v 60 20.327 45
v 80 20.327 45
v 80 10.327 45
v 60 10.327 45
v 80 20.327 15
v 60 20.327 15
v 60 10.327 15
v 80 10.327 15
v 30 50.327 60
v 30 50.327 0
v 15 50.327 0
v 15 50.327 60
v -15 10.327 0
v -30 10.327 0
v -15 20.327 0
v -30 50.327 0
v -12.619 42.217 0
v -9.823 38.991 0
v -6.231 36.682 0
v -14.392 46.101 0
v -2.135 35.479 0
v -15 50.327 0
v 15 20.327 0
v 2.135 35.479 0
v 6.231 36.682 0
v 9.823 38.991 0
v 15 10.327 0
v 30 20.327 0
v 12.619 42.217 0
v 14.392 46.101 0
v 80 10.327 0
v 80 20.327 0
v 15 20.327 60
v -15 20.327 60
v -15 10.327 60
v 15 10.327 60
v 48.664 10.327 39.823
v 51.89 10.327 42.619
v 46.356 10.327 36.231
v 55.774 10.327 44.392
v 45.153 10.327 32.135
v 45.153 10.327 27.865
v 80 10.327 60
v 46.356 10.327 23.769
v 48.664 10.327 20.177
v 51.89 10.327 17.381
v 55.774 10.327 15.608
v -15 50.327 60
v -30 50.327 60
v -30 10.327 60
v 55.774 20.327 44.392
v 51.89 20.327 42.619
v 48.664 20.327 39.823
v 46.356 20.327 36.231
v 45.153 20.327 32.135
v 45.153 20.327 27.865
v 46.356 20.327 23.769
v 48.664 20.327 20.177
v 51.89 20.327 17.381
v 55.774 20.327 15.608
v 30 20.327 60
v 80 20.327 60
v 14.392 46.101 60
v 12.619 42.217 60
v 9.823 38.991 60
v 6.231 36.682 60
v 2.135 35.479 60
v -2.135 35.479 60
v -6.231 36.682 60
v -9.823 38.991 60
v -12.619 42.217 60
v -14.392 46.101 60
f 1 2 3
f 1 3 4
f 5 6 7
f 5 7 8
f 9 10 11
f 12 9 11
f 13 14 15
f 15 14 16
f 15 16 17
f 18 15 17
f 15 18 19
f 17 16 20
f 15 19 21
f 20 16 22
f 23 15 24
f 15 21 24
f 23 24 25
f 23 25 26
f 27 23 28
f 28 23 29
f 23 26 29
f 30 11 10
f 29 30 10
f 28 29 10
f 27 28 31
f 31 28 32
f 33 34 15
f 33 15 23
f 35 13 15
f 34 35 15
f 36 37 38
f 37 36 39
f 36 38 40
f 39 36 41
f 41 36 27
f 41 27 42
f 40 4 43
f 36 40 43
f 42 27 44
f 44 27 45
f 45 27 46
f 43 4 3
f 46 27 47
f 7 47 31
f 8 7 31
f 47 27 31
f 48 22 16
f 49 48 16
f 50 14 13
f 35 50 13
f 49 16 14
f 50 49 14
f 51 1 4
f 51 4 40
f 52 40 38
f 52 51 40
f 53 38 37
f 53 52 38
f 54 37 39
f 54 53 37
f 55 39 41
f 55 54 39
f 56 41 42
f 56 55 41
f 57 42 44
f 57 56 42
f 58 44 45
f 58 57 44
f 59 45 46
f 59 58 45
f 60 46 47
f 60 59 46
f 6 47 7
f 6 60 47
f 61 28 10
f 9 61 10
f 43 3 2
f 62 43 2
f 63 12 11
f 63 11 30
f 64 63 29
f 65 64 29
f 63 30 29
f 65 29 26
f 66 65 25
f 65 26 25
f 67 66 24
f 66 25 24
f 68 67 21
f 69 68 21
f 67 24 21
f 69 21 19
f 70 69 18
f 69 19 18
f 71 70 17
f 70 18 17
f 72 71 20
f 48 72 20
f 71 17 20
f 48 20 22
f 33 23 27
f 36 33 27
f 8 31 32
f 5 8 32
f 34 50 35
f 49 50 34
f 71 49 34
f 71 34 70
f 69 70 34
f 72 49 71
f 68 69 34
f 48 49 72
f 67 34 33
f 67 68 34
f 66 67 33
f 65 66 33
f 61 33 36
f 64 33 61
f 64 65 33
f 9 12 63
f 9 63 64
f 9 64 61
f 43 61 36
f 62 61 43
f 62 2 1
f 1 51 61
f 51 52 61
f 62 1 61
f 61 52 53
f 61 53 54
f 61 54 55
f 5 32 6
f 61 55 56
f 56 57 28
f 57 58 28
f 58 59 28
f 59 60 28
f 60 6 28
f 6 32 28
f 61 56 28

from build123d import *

# Parameters (mm, degrees)
BOSS_EXTRUDE1_DEPTH = 60
CUT_EXTRUDE1_DEPTH  = 60


with BuildPart() as part:
    # Sketch1 → Boss-Extrude1 (new body)
    with BuildSketch(Plane.XY):
        with BuildLine():
            Line((-30, 50.32677643), (-30, 10.32677643))
            Line((-30, 10.32677643), (-15, 10.32677643))
            Line((-15, 10.32677643), (-15, 20.32677643))
            Line((-15, 20.32677643), (15, 20.32677643))
            Line((15, 20.32677643), (15, 10.32677643))
            Line((15, 10.32677643), (80, 10.32677643))
            Line((80, 10.32677643), (80, 20.32677643))
            Line((80, 20.32677643), (30, 20.32677643))
            Line((30, 20.32677643), (30, 50.32677643))
            Line((30, 50.32677643), (15, 50.32677643))
            ThreePointArc((15, 50.32677643), (0, 35.32677643), (-15, 50.32677643))
            Line((-15, 50.32677643), (-30, 50.32677643))
        make_face()
    extrude(amount=BOSS_EXTRUDE1_DEPTH)

    # Sketch2 → Cut-Extrude1 (cut)
    with BuildSketch(Plane(origin=(0, 20.32677643, 0), x_dir=(1, 0, 0), z_dir=(0, 1, 0))):
        with BuildLine():
            Line((80, -15), (80, -45))
            Line((80, -45), (60, -45))
            ThreePointArc((60, -45), (45, -30), (60, -15))
            Line((60, -15), (80, -15))
        make_face()
    extrude(amount=-CUT_EXTRUDE1_DEPTH, mode=Mode.SUBTRACT)


solid = part.part
